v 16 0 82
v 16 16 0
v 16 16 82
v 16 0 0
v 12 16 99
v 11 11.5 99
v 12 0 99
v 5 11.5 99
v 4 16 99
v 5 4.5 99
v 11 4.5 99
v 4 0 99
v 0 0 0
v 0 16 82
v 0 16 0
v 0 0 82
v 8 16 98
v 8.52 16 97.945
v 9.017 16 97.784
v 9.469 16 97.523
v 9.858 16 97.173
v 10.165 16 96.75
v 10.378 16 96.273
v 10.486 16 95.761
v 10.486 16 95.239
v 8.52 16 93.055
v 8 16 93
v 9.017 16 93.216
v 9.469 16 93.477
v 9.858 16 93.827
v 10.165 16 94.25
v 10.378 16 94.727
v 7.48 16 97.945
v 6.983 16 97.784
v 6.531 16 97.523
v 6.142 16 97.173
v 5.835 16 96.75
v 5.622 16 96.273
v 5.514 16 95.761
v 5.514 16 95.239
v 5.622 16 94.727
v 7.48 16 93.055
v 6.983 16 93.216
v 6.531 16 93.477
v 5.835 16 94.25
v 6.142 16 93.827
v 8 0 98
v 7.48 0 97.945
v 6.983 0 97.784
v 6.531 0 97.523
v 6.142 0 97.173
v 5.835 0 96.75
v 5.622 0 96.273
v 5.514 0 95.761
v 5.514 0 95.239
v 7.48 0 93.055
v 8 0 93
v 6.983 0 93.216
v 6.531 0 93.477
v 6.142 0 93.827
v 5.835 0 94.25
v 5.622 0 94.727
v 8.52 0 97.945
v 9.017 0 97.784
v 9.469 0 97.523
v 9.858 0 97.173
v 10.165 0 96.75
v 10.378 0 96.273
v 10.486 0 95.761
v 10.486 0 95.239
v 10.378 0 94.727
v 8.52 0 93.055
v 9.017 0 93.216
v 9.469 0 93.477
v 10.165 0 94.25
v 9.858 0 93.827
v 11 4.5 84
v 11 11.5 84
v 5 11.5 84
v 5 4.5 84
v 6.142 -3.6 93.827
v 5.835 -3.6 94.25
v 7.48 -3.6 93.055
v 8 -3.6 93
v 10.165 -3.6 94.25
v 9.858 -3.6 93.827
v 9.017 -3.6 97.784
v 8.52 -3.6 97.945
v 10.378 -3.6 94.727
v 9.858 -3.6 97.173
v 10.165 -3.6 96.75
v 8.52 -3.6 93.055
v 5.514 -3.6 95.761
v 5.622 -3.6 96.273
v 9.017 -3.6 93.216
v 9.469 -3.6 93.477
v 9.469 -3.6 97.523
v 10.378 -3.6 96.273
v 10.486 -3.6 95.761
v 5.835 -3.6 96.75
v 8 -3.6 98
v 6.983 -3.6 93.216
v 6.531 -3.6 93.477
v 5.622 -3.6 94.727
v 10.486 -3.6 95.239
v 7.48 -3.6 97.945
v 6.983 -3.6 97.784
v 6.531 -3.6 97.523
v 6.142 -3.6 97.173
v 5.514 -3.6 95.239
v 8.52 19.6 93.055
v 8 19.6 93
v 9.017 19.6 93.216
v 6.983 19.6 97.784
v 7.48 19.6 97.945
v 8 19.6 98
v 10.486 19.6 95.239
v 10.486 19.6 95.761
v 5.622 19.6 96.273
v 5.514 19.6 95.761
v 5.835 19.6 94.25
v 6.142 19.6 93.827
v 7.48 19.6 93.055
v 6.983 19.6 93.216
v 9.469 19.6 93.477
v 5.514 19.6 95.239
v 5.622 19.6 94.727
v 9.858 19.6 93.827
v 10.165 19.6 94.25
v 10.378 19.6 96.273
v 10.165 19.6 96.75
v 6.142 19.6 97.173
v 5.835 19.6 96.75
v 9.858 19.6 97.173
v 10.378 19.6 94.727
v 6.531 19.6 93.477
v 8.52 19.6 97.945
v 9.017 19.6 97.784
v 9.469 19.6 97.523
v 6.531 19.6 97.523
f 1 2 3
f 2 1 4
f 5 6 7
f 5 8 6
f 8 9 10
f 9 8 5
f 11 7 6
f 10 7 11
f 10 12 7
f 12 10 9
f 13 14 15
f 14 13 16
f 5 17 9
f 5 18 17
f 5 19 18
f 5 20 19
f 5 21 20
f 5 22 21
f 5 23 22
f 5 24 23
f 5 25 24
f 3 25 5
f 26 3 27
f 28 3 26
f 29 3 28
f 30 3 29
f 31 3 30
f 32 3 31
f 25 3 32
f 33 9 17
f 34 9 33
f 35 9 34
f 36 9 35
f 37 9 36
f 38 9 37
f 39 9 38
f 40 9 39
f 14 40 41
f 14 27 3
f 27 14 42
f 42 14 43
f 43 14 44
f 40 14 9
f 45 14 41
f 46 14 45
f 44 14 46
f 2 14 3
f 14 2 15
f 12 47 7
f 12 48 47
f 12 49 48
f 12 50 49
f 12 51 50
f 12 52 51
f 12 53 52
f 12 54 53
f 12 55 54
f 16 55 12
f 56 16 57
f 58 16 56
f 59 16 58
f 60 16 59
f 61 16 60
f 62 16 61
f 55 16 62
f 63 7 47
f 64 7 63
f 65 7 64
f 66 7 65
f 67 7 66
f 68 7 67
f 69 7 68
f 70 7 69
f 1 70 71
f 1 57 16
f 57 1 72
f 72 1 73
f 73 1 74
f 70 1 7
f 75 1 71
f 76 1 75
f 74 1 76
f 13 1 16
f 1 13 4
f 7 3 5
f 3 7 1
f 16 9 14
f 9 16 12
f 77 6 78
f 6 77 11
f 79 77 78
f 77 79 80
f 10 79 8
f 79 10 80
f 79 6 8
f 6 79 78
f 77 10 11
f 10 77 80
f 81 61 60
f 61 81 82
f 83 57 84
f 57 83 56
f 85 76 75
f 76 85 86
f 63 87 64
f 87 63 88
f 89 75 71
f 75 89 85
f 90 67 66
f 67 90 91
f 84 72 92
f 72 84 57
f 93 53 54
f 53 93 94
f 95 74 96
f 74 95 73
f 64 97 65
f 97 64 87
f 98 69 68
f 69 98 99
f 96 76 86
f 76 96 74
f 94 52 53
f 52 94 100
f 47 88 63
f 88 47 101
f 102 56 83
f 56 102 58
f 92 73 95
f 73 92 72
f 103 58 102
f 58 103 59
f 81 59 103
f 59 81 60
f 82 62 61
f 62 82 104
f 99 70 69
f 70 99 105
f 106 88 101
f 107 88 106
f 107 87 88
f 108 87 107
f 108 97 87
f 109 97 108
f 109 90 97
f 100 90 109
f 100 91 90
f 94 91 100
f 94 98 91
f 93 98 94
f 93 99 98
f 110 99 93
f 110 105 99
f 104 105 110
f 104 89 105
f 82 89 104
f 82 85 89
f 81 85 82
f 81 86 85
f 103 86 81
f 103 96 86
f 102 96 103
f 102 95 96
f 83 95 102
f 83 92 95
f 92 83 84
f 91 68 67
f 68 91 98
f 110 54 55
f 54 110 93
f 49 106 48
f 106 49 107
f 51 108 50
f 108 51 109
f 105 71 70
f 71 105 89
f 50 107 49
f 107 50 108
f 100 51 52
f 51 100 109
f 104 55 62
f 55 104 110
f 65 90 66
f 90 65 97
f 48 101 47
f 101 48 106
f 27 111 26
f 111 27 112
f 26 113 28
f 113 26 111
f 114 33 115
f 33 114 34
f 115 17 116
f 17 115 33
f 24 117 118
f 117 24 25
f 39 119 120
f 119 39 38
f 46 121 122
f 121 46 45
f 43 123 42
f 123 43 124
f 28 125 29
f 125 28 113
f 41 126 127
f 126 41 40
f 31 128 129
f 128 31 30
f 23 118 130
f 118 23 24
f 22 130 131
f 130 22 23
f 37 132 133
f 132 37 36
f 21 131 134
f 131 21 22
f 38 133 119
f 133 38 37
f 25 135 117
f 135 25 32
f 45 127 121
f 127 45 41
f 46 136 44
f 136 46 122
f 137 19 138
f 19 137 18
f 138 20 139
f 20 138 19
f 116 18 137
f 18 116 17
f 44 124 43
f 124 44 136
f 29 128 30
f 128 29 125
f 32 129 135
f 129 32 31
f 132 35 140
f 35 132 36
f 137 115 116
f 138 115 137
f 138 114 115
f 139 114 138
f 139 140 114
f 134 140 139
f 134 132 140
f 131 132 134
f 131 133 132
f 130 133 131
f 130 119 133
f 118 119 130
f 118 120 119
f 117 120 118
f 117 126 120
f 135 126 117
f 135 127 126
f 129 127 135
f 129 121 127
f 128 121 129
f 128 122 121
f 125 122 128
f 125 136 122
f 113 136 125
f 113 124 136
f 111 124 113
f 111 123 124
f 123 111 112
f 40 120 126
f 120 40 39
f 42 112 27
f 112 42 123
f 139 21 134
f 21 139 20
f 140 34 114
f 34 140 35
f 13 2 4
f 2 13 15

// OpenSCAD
$fs = 0.4;

grip_size = 16;
grip_length = 18;

lever_length = 81;
tip_height = 8;
cut_from_end = 17;
tip_right_edge = (grip_size + tip_height) / 2;

pin_height = 3.6;
pin_width = 5;
pin_setback = 1;

switch_height = 6;
switch_width = 7;
switch_depth = 15;

epsilon = 0.00;

module end_cutter() {
  translate([0, grip_size + epsilon, 0])
      rotate([90, 0, 0])
          linear_extrude(height = grip_size + 2 * epsilon)
              polygon([
                  [grip_size, lever_length - cut_from_end],
                  [grip_size, lever_length],
                  [tip_right_edge, lever_length]
              ]);
}

module pin() {
    translate([
        grip_size / 2, 
        0, 
        lever_length + grip_length - pin_setback - pin_width / 2
    ])
        rotate([90, 90, 0])
            cylinder(pin_height, pin_width / 2, pin_width / 2);
}

// grip
color("grey") cube([grip_size, grip_size, grip_length]);

color("saddlebrown") {
    difference() {
        // lever    
        translate([0, 0, grip_length])
            difference() {
              cube([grip_size, grip_size, lever_length]);

              // First side
              end_cutter();

              // Mirrored opposite side
              translate([grip_size, 0, 0])
                  mirror([1, 0, 0])
                      end_cutter();
            }
        
        // switch hole
        translate([
            (grip_size - switch_height) / 2, 
            (grip_size - switch_width) / 2, 
            grip_length + lever_length - switch_depth
        ]) cube([switch_height, switch_width, switch_depth]);
    }
        
    // pins
    pin();
    
    translate([0, grip_size, 0]) mirror([0, 1, 0]) pin();
}
    
